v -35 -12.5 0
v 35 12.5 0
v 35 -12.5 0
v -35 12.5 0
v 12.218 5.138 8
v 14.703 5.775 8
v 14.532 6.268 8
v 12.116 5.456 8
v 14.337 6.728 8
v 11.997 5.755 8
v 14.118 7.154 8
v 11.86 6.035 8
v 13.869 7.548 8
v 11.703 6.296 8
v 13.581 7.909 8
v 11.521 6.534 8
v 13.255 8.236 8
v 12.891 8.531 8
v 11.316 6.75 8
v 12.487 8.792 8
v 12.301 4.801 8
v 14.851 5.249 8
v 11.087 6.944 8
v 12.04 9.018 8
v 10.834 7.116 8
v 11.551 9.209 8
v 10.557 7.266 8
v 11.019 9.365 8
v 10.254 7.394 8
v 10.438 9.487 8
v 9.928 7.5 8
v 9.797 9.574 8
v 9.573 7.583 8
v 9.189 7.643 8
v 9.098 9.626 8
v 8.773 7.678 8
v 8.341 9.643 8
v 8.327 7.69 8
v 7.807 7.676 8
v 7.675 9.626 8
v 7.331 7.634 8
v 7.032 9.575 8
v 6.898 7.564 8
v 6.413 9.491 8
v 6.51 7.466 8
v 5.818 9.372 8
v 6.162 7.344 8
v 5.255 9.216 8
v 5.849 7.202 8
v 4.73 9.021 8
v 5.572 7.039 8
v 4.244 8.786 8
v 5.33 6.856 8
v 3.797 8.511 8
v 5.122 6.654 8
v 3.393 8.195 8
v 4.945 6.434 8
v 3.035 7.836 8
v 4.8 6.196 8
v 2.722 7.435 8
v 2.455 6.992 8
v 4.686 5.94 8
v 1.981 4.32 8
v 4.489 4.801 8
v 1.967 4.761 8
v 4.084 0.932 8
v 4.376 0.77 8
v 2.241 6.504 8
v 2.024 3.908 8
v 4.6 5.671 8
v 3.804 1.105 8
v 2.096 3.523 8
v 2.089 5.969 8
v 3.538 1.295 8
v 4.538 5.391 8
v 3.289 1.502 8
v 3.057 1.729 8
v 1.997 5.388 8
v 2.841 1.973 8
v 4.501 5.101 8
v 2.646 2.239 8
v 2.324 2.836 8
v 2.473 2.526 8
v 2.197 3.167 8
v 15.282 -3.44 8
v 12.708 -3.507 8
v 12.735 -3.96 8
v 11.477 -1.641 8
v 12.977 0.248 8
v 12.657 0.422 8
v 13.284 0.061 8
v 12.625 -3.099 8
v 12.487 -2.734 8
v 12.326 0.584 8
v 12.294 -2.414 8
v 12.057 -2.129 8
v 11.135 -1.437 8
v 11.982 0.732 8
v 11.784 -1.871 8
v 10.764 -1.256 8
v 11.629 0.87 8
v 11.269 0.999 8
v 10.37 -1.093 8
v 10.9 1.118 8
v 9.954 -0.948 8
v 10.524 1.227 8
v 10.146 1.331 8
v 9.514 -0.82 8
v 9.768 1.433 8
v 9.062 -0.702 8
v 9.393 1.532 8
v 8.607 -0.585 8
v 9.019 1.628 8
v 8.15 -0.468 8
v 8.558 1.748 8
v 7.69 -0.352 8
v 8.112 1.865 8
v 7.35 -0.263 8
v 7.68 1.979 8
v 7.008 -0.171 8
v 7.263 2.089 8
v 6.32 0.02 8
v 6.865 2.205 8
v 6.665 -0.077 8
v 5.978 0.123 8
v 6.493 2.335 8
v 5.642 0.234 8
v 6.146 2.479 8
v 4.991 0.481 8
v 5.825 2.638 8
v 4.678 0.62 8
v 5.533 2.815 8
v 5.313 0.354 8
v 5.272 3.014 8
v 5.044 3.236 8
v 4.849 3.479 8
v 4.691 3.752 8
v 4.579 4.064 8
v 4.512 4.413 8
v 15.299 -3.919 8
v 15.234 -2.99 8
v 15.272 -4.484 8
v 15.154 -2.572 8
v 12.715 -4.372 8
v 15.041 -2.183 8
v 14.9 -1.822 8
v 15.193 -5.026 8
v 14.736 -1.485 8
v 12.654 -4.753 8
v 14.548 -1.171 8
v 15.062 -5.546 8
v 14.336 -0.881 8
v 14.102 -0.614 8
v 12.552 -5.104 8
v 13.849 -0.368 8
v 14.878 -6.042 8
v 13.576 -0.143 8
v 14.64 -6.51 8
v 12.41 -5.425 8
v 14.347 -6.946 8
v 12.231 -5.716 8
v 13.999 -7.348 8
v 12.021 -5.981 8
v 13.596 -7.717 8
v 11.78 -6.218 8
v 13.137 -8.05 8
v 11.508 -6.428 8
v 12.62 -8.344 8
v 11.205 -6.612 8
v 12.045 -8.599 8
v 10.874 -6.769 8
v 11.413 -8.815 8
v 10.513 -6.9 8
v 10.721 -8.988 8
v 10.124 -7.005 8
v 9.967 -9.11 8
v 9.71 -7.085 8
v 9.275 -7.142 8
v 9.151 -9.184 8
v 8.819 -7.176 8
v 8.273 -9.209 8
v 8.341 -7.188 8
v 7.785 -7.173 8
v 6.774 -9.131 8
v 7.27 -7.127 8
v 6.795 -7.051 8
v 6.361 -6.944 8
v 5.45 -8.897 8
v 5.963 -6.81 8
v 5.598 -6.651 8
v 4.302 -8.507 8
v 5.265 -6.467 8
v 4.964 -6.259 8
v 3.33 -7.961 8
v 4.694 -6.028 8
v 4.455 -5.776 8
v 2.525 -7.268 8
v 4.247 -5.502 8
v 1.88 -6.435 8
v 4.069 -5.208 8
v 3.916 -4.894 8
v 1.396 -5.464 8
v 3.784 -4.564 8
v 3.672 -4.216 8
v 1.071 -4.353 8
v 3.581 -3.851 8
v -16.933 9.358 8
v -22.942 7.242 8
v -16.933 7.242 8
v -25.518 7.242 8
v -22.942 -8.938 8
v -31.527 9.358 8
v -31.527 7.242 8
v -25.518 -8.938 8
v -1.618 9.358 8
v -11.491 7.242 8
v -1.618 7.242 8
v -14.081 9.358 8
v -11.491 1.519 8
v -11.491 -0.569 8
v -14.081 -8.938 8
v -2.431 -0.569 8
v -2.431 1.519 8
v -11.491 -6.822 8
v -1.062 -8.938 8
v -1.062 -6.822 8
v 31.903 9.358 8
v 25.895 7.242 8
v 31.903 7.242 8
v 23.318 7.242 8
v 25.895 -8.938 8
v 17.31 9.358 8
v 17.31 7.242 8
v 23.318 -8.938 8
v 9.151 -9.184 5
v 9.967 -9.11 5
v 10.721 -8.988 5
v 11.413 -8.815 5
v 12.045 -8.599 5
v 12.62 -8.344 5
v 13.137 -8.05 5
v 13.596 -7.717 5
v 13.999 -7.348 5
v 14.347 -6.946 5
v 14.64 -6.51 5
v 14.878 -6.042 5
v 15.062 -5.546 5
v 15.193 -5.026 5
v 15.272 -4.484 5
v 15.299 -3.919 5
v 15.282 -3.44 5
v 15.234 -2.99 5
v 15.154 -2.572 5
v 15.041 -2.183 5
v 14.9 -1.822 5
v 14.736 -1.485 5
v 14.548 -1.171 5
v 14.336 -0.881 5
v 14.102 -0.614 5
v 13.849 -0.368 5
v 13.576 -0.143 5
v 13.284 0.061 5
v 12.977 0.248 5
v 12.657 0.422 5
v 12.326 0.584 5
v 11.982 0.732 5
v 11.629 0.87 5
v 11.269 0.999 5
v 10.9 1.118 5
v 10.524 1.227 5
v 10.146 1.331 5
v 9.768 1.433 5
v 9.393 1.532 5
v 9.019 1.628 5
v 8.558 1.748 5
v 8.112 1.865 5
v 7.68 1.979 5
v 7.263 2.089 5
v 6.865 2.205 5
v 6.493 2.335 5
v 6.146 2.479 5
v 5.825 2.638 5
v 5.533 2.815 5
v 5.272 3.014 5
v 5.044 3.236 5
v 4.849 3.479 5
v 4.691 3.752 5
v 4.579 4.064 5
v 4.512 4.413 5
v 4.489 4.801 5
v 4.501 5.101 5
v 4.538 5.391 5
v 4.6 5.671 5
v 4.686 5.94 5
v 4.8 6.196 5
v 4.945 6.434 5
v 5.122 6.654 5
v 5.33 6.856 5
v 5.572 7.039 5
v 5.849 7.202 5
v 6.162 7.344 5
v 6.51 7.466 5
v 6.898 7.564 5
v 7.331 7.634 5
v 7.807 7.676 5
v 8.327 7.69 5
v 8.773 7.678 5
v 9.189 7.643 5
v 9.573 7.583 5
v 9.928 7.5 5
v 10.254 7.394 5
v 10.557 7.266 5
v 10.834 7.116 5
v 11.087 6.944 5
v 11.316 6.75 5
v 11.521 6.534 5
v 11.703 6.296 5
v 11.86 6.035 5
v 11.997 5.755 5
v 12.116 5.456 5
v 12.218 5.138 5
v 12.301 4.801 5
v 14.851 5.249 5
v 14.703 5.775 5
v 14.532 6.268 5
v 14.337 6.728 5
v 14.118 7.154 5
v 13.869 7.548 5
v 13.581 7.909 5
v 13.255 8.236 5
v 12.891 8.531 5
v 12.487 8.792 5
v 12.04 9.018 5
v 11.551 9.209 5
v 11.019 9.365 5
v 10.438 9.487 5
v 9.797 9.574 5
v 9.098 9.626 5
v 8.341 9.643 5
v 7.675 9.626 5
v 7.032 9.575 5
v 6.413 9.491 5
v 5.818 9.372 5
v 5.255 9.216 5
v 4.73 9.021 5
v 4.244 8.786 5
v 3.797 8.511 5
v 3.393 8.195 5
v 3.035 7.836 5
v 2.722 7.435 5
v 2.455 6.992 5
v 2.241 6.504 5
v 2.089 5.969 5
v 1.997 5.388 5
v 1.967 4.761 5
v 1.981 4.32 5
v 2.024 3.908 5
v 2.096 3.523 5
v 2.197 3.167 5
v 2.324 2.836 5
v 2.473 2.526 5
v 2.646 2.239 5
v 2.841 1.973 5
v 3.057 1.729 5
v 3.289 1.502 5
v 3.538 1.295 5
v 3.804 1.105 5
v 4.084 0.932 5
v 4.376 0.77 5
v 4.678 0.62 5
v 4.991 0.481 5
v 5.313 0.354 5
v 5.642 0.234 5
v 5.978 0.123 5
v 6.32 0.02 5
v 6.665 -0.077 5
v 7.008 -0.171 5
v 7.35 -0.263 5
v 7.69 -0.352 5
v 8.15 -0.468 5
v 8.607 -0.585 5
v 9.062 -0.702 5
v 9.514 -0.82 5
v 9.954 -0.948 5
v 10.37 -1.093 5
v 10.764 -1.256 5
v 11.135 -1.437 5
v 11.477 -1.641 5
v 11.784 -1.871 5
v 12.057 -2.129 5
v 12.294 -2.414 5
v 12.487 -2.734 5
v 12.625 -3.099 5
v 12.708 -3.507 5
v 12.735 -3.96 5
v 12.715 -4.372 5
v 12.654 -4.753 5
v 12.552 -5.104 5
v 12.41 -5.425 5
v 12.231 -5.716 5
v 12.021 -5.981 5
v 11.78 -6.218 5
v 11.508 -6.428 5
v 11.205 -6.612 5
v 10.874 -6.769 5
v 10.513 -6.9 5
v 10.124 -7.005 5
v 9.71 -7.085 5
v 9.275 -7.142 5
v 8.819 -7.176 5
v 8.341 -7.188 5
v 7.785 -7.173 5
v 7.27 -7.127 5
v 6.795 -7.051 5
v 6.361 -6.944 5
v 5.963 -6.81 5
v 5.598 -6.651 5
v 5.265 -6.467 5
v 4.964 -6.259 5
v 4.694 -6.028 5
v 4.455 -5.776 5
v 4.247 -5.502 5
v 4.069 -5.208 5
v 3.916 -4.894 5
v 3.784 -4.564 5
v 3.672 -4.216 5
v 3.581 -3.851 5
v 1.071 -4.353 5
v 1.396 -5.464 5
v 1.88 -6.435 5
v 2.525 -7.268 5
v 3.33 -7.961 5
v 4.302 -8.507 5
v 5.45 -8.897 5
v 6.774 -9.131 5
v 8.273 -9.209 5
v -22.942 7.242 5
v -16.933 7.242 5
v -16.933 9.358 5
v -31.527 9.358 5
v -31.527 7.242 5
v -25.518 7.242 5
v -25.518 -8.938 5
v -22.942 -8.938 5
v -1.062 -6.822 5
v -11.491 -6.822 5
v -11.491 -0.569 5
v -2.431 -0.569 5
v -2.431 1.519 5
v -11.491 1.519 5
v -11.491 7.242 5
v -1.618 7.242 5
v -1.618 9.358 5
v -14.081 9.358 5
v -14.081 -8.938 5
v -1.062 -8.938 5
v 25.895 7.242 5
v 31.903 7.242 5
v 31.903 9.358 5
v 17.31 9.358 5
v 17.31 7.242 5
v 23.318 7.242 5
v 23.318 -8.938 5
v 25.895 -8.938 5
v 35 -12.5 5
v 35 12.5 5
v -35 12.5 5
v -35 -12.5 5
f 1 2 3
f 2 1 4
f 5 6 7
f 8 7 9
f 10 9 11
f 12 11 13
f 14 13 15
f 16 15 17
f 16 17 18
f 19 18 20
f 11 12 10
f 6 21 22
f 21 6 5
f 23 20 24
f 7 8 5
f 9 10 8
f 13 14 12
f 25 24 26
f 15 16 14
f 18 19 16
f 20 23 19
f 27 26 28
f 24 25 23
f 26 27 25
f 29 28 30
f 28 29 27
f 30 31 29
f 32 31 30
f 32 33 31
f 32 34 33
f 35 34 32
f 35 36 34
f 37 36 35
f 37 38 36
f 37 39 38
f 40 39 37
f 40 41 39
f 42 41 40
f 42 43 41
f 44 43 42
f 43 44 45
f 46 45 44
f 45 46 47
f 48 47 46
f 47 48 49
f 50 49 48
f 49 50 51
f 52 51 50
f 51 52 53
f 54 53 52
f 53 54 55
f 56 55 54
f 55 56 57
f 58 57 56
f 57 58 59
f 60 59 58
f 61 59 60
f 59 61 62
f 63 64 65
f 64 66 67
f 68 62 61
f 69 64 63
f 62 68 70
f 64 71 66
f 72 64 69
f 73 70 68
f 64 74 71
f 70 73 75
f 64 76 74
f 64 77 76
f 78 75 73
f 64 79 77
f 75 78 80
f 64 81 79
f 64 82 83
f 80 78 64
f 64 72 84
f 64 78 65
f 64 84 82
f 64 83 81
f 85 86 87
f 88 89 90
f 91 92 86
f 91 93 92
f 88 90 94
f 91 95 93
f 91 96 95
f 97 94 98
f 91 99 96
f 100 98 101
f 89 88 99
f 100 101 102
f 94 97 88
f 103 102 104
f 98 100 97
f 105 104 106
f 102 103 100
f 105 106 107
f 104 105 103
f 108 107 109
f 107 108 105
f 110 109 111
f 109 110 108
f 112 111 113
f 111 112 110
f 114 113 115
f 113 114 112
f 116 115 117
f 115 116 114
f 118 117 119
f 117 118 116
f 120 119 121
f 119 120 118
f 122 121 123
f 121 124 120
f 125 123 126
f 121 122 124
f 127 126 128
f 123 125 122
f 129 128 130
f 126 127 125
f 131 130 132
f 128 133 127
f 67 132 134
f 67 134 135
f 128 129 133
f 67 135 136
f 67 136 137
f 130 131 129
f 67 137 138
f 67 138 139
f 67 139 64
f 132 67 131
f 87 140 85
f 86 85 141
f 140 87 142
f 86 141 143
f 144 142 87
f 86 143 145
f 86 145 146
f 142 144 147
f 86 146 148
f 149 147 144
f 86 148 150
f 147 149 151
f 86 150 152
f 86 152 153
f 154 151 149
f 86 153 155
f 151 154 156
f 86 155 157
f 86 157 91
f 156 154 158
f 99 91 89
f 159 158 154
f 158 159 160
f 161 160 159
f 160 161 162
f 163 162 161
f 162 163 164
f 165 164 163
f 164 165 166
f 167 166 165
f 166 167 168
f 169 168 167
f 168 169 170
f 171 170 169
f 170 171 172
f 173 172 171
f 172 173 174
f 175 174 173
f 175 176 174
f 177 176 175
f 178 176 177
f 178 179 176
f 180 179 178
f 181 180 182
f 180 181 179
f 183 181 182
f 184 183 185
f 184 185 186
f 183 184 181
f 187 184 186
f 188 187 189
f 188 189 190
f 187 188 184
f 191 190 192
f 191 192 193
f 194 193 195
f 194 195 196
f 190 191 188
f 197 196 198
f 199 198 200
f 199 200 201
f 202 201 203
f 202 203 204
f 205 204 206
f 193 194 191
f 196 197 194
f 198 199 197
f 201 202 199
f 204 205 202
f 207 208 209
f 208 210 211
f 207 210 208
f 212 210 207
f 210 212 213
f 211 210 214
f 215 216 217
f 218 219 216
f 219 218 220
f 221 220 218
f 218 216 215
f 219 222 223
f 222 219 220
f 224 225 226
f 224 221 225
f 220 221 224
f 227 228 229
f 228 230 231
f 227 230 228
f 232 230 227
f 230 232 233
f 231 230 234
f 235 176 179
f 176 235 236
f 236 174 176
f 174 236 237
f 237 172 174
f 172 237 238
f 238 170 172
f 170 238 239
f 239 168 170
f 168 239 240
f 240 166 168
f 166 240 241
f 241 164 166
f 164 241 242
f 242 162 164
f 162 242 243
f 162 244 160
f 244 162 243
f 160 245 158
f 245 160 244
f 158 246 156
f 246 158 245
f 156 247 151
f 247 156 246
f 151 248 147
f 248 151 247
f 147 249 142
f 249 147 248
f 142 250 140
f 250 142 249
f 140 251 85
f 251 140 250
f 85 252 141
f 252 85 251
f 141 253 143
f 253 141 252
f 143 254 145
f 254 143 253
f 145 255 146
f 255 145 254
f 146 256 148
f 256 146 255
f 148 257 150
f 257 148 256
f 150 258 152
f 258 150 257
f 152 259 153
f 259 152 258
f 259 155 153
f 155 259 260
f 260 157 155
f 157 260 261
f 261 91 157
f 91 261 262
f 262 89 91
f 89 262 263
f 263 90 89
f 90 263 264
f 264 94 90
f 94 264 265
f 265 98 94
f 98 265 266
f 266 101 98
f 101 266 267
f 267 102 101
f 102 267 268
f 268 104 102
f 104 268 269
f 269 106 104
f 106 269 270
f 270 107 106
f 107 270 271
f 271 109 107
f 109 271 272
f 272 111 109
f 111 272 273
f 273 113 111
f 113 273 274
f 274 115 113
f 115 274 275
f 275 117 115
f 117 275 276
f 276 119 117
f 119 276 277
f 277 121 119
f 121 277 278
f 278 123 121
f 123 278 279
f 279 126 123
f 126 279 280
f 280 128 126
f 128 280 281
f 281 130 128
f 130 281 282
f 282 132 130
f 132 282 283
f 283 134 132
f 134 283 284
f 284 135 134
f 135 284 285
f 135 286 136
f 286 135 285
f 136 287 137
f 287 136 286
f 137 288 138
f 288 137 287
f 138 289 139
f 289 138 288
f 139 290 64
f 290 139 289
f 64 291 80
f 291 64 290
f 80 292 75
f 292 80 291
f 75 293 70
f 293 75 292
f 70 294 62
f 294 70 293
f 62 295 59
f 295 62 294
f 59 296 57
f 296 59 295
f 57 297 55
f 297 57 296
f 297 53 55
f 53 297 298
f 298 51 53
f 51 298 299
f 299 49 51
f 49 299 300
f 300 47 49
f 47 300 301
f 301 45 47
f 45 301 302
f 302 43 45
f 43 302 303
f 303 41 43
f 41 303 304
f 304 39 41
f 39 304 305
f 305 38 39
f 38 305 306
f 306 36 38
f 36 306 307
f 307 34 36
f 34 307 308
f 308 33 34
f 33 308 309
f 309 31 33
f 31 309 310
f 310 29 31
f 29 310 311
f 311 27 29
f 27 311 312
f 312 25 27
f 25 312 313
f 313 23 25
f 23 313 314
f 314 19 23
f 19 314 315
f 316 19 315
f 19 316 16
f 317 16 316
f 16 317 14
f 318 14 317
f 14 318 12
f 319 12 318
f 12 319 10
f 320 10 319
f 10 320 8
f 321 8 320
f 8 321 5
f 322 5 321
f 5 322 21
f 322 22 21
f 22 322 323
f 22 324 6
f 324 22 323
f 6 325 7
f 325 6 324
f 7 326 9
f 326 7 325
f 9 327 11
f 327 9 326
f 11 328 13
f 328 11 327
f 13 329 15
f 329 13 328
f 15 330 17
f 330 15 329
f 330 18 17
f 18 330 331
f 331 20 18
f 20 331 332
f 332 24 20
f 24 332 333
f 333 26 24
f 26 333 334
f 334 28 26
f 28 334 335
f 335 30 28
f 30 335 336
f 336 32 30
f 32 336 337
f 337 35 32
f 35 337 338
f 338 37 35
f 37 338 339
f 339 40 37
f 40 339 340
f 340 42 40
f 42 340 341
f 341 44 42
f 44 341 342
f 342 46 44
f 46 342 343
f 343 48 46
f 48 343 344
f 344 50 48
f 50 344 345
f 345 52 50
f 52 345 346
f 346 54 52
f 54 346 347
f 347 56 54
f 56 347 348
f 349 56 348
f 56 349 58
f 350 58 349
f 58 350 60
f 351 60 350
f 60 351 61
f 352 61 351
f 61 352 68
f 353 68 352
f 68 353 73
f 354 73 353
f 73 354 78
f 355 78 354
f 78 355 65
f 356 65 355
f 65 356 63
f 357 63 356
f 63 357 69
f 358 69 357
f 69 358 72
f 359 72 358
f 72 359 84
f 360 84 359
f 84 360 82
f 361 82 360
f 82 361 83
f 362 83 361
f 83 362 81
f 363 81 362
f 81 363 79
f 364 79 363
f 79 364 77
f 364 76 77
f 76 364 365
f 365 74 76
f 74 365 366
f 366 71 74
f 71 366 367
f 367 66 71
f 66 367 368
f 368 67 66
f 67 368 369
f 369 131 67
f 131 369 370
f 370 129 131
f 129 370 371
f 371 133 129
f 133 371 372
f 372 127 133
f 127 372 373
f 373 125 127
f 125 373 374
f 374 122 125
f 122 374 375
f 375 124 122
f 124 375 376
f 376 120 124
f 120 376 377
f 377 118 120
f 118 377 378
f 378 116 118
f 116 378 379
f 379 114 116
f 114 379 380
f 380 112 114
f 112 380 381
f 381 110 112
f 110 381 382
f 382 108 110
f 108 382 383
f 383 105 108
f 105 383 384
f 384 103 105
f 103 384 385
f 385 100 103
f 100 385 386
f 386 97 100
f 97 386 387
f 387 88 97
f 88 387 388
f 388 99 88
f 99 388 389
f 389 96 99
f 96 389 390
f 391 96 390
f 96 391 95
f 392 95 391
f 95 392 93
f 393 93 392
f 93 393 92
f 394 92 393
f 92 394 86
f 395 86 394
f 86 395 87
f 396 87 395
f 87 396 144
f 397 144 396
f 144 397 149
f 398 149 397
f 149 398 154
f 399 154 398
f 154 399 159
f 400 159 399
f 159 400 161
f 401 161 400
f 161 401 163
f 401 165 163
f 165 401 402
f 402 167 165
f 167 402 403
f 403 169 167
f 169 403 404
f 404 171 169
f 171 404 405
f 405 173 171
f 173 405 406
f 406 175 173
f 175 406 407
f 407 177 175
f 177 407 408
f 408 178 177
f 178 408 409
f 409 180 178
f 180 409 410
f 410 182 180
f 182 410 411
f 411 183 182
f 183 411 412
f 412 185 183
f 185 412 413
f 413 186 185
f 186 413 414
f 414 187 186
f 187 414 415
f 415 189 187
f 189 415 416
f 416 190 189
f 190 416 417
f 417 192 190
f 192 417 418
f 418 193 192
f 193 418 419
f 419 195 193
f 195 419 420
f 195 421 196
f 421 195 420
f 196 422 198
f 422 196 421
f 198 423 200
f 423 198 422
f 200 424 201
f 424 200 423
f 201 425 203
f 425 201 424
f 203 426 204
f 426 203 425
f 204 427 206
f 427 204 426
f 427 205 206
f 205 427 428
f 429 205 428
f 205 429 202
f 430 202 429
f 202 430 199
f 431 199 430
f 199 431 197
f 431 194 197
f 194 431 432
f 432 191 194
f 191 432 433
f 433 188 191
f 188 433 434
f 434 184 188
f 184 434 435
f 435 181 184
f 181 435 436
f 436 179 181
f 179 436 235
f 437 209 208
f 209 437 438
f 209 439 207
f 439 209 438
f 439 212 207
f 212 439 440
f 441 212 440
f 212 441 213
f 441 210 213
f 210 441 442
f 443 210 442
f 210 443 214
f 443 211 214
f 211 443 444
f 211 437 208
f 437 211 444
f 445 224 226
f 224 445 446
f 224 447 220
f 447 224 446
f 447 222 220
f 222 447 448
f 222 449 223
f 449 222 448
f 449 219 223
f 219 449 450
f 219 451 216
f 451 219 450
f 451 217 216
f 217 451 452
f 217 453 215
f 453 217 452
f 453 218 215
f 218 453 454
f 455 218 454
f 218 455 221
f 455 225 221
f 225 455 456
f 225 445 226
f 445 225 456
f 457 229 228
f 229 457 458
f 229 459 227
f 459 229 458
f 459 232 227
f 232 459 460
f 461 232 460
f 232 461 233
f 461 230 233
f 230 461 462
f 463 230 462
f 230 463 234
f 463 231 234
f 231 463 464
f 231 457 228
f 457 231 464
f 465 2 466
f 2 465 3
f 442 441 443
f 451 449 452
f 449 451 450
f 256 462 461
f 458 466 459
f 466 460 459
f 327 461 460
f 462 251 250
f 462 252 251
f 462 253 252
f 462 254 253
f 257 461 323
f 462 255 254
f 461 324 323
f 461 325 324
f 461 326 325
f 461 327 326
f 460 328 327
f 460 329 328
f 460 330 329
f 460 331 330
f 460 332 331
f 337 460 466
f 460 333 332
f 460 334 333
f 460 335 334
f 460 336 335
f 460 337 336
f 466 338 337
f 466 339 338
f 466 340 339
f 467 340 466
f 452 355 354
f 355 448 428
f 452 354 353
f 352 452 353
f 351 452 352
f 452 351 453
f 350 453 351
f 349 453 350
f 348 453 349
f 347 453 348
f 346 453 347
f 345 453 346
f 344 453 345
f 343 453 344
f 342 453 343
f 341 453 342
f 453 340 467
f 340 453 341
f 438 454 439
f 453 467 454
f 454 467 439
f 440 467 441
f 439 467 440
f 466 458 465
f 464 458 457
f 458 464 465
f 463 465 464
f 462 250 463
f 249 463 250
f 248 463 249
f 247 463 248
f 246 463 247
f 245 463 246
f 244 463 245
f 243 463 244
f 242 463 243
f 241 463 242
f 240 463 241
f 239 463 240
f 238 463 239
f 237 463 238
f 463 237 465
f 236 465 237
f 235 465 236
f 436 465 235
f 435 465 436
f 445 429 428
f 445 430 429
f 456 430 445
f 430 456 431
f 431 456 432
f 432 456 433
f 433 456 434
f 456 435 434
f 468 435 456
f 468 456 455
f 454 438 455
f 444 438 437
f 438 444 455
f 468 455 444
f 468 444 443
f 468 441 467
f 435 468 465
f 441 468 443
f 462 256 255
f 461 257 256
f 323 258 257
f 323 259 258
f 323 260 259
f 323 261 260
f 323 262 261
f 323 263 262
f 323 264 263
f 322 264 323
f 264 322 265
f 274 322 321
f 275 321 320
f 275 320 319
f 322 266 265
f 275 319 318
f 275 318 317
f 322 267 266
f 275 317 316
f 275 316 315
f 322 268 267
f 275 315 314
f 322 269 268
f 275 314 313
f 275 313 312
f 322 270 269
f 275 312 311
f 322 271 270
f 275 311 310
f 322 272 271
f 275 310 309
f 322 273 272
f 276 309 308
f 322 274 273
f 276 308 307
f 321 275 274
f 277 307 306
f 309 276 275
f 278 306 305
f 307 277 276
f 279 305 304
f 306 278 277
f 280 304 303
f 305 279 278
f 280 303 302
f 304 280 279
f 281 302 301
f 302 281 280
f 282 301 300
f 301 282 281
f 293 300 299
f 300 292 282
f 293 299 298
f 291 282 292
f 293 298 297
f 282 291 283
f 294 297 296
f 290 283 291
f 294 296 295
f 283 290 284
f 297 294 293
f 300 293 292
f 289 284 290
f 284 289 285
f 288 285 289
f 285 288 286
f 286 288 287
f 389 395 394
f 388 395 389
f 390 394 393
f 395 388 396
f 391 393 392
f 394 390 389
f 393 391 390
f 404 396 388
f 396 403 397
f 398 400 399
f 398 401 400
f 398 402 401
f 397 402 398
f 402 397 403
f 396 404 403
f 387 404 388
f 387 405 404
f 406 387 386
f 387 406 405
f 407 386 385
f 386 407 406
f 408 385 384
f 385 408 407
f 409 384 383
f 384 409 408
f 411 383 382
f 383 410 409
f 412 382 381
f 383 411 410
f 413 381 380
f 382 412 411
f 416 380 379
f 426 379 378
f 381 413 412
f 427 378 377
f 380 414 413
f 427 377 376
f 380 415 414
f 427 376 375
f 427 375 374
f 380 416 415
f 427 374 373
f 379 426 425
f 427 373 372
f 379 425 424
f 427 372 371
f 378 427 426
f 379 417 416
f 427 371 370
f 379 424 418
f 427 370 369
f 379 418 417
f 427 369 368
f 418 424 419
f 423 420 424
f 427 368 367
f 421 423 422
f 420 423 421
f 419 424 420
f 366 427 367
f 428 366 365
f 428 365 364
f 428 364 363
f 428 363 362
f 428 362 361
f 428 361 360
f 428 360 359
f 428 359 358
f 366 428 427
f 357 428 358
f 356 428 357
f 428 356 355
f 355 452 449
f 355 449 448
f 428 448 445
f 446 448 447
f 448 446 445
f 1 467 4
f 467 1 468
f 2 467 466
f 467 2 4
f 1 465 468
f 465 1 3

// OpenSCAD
linear_extrude(8)
    text("TEST", size=20, halign="center", valign="center", font="Liberation Mono");
translate([-35, -12.5, 0])
    cube([70, 25, 5]);
